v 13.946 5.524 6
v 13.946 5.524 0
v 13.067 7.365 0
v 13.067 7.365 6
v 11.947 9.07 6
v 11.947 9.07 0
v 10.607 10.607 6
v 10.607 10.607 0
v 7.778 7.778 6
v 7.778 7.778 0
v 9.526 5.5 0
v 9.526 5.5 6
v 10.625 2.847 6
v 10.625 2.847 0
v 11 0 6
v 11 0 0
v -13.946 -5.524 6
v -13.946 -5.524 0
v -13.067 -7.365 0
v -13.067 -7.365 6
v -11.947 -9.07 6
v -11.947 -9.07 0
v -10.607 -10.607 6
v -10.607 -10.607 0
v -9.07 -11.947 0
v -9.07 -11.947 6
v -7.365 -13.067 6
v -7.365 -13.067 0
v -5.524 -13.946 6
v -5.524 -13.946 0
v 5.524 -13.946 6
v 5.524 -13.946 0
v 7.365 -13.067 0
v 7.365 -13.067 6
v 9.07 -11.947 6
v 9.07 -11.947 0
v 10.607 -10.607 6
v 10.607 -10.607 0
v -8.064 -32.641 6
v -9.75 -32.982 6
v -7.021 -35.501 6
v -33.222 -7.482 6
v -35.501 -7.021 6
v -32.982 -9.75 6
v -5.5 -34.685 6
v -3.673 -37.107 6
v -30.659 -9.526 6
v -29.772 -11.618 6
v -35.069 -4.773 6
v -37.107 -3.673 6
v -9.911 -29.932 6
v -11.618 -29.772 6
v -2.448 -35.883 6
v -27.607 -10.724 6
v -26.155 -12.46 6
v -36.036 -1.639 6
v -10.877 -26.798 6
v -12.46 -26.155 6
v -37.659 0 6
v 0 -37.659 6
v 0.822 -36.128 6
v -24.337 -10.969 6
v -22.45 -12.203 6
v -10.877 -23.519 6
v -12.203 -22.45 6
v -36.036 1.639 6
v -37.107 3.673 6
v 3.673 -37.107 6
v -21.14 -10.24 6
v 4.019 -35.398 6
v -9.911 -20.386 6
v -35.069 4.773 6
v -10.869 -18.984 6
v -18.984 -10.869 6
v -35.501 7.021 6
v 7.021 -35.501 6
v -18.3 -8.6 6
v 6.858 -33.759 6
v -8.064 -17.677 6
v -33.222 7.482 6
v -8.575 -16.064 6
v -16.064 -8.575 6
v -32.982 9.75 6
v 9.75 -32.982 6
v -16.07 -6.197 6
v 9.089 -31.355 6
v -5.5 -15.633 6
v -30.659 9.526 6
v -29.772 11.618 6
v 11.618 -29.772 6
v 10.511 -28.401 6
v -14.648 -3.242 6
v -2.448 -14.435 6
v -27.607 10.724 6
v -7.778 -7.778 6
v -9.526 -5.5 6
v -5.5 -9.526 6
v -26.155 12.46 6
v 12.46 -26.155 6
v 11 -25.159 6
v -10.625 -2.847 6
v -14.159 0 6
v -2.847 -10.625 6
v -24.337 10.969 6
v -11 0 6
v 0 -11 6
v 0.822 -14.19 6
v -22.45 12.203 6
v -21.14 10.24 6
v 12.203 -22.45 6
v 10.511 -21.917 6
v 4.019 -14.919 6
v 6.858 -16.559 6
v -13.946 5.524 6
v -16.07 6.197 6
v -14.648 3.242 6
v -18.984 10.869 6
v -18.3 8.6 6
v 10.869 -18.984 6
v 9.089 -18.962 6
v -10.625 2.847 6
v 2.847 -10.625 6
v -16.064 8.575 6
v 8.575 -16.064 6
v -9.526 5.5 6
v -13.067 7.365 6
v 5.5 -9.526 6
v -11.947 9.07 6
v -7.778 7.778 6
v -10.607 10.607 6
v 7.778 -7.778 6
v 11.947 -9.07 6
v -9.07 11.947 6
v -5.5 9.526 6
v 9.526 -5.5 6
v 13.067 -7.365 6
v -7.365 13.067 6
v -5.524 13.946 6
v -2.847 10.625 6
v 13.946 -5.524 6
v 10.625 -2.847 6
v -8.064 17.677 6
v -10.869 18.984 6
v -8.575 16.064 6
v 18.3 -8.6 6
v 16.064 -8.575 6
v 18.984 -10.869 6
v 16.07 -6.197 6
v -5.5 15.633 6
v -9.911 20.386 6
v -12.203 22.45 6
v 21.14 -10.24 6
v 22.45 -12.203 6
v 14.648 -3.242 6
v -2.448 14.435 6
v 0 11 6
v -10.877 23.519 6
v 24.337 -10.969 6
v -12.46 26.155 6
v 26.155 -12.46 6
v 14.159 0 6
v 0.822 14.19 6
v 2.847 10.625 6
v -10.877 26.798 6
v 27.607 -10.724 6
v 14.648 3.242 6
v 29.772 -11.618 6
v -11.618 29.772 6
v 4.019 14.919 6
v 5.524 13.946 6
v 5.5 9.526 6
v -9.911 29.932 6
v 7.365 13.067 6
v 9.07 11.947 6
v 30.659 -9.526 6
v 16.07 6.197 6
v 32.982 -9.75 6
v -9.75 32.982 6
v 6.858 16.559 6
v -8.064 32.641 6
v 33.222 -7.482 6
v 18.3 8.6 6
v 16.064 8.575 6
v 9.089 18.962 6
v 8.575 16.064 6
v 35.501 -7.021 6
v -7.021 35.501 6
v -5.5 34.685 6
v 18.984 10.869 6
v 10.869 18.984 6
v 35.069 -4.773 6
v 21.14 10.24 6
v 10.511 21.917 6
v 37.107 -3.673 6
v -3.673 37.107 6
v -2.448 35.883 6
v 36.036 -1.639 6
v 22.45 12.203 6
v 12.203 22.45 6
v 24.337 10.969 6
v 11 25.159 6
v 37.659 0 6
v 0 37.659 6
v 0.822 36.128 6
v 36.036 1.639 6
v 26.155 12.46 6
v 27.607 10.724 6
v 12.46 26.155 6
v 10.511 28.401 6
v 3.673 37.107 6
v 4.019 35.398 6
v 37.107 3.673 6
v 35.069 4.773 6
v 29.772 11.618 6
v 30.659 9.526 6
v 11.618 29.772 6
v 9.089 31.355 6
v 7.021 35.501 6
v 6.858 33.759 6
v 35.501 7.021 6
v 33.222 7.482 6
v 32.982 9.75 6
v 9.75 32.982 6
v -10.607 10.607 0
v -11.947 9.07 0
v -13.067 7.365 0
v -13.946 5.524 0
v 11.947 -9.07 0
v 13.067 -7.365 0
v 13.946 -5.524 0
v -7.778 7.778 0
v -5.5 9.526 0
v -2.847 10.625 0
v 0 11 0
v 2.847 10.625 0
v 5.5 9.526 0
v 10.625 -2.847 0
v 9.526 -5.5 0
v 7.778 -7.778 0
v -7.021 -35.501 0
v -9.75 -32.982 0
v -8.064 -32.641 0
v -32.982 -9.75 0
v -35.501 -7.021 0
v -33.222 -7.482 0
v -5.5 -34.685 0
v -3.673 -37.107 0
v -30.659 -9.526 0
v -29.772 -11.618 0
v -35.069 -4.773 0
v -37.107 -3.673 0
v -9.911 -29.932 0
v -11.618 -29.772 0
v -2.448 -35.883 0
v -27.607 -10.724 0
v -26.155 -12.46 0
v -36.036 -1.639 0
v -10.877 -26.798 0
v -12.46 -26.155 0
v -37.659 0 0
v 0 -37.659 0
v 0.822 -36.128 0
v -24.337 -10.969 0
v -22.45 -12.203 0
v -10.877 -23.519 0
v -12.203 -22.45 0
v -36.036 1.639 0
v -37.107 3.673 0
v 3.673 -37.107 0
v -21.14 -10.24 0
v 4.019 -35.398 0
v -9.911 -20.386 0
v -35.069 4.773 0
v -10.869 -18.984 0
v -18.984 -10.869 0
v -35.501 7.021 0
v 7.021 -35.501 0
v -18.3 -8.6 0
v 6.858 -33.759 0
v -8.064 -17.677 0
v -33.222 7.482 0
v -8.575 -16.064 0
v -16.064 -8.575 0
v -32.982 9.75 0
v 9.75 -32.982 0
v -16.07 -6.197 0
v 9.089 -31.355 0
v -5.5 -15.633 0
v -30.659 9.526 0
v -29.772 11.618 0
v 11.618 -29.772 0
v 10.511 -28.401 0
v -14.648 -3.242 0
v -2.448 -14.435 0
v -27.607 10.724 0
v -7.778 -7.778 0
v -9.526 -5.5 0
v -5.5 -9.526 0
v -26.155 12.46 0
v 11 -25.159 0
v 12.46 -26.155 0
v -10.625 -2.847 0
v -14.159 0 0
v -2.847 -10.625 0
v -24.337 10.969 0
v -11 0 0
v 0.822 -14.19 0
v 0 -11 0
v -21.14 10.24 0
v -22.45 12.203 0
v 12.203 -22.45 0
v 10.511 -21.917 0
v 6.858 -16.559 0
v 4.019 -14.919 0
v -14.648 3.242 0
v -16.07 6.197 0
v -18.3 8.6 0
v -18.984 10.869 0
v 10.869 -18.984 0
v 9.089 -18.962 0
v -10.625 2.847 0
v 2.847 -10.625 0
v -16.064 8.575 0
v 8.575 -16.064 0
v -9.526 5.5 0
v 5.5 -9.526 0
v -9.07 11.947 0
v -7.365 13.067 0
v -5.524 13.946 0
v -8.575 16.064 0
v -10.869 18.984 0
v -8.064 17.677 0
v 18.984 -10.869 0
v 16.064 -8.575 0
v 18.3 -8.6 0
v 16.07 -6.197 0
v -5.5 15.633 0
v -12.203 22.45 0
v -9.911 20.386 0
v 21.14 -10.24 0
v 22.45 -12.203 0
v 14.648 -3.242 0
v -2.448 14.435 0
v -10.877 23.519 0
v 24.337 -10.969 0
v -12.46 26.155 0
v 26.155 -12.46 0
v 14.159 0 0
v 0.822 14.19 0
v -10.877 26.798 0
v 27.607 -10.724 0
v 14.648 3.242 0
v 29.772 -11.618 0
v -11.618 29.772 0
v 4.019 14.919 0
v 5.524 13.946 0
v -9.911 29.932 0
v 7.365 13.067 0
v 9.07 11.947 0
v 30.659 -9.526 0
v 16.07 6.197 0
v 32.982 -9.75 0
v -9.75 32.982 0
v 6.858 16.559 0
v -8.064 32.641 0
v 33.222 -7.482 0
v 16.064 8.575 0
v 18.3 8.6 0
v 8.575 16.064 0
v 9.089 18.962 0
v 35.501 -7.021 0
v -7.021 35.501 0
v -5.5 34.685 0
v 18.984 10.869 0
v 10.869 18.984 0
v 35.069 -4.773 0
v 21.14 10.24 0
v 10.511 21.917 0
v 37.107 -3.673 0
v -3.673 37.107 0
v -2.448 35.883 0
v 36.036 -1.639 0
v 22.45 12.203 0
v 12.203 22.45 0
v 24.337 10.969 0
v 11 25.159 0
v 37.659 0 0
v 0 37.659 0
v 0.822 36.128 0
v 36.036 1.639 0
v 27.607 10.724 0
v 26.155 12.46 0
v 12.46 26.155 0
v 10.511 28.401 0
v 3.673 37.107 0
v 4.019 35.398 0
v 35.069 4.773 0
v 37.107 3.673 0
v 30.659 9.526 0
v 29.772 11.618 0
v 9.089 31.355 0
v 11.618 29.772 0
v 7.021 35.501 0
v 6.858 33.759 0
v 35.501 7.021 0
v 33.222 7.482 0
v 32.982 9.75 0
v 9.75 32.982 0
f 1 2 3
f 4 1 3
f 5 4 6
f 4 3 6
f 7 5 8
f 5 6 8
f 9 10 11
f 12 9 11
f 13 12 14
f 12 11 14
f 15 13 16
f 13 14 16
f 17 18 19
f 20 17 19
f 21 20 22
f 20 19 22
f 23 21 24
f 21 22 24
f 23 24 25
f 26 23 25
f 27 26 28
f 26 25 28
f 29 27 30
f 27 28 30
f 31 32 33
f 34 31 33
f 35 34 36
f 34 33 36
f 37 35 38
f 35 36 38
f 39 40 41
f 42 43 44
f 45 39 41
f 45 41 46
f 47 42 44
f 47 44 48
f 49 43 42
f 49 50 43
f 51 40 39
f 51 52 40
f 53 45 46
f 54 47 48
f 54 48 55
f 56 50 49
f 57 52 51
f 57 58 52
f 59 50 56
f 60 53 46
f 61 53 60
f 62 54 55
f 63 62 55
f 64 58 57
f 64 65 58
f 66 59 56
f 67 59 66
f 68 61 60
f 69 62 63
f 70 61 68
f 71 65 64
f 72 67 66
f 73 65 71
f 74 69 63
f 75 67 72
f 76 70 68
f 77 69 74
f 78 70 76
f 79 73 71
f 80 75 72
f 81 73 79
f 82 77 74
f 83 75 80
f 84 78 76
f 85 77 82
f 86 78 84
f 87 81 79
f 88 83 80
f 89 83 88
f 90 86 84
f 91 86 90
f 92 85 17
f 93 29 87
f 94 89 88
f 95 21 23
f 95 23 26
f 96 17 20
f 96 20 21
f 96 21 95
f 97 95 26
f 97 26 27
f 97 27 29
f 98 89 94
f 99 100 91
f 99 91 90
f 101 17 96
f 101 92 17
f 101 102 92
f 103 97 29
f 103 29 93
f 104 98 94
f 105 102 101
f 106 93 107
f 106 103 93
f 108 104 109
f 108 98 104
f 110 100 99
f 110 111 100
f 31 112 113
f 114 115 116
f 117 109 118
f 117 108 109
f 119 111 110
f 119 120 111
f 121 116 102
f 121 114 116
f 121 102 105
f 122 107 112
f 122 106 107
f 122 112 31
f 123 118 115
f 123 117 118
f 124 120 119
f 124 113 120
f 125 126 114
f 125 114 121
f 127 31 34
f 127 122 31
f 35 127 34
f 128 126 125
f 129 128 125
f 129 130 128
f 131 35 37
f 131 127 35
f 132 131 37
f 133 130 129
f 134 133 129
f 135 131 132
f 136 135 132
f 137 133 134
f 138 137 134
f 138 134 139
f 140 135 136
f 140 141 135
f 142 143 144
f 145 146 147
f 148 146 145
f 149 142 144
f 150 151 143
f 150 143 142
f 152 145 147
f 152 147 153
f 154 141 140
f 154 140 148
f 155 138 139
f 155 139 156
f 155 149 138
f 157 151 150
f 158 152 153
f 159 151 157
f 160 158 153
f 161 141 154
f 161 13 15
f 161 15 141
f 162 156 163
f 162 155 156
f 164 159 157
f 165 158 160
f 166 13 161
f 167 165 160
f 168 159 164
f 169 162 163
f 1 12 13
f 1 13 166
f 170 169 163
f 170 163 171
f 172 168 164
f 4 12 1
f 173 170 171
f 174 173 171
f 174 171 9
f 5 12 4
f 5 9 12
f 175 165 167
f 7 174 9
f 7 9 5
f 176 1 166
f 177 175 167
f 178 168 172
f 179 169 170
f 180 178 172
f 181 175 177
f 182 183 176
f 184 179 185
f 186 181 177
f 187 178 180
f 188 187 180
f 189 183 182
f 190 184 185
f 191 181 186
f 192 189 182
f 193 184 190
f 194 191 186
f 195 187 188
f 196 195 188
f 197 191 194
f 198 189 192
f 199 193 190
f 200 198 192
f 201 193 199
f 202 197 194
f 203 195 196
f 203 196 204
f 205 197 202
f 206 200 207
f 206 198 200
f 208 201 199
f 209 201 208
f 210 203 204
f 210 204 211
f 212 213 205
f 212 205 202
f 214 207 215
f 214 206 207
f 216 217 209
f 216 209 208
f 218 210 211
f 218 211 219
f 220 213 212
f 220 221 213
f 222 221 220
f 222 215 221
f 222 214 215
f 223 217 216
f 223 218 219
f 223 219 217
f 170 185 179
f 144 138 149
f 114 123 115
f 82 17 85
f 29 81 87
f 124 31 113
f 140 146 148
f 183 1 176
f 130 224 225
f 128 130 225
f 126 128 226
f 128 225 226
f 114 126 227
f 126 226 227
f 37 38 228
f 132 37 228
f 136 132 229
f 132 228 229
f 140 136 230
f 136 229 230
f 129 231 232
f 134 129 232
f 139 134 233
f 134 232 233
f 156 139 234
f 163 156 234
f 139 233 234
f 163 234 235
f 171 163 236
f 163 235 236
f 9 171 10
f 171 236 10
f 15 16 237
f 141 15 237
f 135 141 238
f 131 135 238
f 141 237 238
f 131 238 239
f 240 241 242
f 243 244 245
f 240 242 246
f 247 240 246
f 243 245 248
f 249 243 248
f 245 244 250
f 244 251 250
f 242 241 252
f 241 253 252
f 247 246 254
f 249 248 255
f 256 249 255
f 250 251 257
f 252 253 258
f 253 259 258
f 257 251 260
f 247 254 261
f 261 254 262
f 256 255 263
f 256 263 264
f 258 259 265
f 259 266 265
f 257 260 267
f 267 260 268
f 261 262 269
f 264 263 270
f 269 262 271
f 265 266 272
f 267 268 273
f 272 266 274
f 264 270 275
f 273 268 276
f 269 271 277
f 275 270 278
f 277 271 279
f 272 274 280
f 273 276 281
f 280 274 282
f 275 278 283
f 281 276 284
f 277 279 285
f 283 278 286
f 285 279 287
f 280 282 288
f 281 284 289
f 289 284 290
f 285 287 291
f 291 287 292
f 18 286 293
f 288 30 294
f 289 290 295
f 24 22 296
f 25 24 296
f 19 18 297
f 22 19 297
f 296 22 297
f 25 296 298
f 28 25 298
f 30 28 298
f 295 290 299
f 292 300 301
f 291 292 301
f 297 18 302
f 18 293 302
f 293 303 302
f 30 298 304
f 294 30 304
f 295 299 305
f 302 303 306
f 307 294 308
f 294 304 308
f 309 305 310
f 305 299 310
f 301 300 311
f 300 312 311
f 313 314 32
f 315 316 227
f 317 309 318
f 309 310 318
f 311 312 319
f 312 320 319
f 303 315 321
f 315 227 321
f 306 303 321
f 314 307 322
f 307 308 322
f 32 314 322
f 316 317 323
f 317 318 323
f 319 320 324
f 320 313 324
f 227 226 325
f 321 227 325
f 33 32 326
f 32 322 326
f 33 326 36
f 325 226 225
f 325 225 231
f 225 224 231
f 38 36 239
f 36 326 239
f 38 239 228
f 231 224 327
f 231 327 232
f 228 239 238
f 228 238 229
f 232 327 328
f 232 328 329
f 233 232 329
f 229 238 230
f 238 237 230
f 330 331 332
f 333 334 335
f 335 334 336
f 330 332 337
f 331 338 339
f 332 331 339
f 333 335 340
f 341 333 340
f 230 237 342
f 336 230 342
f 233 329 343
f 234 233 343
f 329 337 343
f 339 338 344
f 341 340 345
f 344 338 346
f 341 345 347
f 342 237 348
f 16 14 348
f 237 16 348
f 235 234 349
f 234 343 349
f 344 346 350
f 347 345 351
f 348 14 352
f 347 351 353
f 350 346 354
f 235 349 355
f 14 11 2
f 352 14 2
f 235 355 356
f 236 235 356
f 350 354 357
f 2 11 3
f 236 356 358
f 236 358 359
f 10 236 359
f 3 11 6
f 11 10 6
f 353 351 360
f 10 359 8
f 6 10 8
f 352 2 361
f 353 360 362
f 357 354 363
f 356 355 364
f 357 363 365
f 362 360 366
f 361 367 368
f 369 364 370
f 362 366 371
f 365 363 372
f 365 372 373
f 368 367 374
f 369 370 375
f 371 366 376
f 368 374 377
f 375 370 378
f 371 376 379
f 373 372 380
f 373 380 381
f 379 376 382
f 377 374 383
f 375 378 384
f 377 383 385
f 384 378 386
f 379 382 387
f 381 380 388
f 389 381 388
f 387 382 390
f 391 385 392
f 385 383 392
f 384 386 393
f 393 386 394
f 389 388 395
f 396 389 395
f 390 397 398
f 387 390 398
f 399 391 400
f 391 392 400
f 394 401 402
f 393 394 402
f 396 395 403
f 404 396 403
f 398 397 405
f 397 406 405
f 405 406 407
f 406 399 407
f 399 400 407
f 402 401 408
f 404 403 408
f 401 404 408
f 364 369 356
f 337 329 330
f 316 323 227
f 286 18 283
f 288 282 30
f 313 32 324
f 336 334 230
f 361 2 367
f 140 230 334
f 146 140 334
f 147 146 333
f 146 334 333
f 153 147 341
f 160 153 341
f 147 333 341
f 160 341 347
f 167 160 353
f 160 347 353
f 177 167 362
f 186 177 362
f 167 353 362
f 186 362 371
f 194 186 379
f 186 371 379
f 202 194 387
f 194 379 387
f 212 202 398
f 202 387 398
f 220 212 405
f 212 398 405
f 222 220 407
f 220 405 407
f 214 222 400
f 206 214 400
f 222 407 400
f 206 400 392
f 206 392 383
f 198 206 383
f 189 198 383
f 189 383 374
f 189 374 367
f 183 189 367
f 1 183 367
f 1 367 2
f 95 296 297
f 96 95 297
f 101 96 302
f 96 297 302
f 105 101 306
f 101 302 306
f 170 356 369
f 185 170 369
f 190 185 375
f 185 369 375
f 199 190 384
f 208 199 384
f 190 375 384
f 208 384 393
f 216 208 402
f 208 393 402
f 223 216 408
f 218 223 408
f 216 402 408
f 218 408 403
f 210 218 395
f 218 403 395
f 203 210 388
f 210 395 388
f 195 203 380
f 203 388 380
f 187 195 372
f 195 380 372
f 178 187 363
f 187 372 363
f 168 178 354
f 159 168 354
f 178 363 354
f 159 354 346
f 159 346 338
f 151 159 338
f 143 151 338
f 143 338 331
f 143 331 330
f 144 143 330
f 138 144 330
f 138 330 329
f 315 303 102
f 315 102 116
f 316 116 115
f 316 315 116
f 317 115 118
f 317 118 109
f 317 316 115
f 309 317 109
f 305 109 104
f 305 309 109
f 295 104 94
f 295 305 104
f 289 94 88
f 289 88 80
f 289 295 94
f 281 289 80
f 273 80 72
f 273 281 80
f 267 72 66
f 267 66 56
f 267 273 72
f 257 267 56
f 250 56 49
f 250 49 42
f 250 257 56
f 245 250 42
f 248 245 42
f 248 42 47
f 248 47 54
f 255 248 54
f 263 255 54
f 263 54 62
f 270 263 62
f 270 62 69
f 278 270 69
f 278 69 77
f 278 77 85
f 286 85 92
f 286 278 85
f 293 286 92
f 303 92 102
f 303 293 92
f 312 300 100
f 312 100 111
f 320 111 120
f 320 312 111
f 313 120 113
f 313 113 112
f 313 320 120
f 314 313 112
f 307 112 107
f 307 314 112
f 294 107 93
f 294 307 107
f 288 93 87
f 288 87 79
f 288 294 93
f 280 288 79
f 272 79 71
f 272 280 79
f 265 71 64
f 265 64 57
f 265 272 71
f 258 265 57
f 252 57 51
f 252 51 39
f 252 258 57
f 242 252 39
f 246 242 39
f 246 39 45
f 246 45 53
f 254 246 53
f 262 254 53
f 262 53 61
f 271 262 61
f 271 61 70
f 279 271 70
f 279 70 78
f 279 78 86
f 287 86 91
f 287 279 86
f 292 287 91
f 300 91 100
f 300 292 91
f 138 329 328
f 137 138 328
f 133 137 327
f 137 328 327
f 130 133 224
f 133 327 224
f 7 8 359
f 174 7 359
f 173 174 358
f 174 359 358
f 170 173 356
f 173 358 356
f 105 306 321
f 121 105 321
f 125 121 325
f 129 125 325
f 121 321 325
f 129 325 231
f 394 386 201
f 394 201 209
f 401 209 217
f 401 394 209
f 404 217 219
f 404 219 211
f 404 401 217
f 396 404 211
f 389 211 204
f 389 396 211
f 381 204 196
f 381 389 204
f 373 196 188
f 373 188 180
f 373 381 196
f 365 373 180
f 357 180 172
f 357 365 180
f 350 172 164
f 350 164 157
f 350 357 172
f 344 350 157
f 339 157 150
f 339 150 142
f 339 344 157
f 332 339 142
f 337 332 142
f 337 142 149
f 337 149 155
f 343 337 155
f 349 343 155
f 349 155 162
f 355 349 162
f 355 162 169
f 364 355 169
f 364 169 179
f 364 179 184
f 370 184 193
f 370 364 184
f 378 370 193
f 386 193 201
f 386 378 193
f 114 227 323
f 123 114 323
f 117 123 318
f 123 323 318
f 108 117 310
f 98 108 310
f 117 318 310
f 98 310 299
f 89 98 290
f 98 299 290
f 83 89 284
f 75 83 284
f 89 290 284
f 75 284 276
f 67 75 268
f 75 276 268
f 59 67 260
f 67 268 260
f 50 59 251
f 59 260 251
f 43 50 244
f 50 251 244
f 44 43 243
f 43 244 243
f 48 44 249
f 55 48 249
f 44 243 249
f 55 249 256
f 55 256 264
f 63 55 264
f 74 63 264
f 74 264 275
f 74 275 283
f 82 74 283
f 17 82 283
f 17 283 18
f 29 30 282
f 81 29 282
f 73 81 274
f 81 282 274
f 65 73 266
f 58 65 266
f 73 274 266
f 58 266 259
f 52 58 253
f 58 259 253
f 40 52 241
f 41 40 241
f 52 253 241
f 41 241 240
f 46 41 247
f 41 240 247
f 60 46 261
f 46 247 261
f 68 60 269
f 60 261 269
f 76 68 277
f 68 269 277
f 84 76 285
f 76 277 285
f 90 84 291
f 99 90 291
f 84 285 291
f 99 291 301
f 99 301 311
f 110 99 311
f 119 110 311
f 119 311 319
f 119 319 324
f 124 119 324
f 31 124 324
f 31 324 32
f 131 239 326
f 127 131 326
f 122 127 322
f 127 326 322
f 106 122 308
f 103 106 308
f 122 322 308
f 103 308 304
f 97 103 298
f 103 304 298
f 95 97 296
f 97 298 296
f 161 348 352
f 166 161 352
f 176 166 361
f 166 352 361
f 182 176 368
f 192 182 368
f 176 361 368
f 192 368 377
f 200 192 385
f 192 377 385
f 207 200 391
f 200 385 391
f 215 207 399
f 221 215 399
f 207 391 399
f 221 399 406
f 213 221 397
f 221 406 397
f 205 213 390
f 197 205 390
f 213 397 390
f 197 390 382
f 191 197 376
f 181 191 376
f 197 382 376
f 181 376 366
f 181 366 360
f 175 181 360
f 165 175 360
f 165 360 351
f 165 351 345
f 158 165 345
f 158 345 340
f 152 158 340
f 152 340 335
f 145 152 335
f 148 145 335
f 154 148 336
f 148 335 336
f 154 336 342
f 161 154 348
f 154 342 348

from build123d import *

# Parameters (mm, degrees)
F0_R     = 11
F1_DEPTH = 6


with BuildPart() as f1:
    # F0 (on Top) → F1 (new body)
    with BuildSketch(Plane.XY):
        with BuildLine():
            ThreePointArc((36.158809, 0), (25.158809, 11), (14.158809, 0))
            ThreePointArc((14.158809, 0), (25.158809, -11), (36.158809, 0))
        make_face()
        with Locations((-25.158809, 0)):
            Circle(F0_R)
        with BuildLine():
            ThreePointArc((5.524196, 13.945725), (0, 37.658809), (-5.524196, 13.945725))
            ThreePointArc((-5.524196, 13.945725), (-8.236389, 12.536423), (-10.606602, 10.606602))
            ThreePointArc((-10.606602, 10.606602), (-12.536423, 8.236389), (-13.945725, 5.524196))
            ThreePointArc((-13.945725, 5.524196), (-37.658809, 0), (-13.945725, -5.524196))
            ThreePointArc((-13.945725, -5.524196), (-12.536423, -8.236389), (-10.606602, -10.606602))
            ThreePointArc((-10.606602, -10.606602), (-8.236389, -12.536423), (-5.524196, -13.945725))
            ThreePointArc((-5.524196, -13.945725), (0, -37.658809), (5.524196, -13.945725))
            ThreePointArc((5.524196, -13.945725), (8.236389, -12.536423), (10.606602, -10.606602))
            ThreePointArc((10.606602, -10.606602), (12.536423, -8.236389), (13.945725, -5.524196))
            ThreePointArc((13.945725, -5.524196), (37.658809, 0), (13.945725, 5.524196))
            ThreePointArc((13.945725, 5.524196), (12.536423, 8.236389), (10.606602, 10.606602))
            ThreePointArc((10.606602, 10.606602), (8.236389, 12.536423), (5.524196, 13.945725))
        make_face()
        with Locations((0, -25.158809)):
            Circle(F0_R, mode=Mode.SUBTRACT)
        with Locations((-25.158809, 0)):
            Circle(F0_R, mode=Mode.SUBTRACT)
        with BuildLine():
            ThreePointArc((-7.778175, 7.778175), (0, 11), (7.778175, 7.778175))
            ThreePointArc((7.778175, 7.778175), (10.162675, 4.209518), (11, 0))
            ThreePointArc((11, 0), (10.162675, -4.209518), (7.778175, -7.778175))
            ThreePointArc((7.778175, -7.778175), (0, -11), (-7.778175, -7.778175))
            ThreePointArc((-7.778175, -7.778175), (-10.162675, -4.209518), (-11, 0))
            ThreePointArc((-11, 0), (-10.162675, 4.209518), (-7.778175, 7.778175))
        make_face(mode=Mode.SUBTRACT)
        with BuildLine():
            ThreePointArc((36.158809, 0), (25.158809, -11), (14.158809, 0))
            ThreePointArc((14.158809, 0), (25.158809, 11), (36.158809, 0))
        make_face(mode=Mode.SUBTRACT)
        with Locations((0, 25.158809)):
            Circle(F0_R, mode=Mode.SUBTRACT)
    extrude(amount=F1_DEPTH)


solid = f1.part
